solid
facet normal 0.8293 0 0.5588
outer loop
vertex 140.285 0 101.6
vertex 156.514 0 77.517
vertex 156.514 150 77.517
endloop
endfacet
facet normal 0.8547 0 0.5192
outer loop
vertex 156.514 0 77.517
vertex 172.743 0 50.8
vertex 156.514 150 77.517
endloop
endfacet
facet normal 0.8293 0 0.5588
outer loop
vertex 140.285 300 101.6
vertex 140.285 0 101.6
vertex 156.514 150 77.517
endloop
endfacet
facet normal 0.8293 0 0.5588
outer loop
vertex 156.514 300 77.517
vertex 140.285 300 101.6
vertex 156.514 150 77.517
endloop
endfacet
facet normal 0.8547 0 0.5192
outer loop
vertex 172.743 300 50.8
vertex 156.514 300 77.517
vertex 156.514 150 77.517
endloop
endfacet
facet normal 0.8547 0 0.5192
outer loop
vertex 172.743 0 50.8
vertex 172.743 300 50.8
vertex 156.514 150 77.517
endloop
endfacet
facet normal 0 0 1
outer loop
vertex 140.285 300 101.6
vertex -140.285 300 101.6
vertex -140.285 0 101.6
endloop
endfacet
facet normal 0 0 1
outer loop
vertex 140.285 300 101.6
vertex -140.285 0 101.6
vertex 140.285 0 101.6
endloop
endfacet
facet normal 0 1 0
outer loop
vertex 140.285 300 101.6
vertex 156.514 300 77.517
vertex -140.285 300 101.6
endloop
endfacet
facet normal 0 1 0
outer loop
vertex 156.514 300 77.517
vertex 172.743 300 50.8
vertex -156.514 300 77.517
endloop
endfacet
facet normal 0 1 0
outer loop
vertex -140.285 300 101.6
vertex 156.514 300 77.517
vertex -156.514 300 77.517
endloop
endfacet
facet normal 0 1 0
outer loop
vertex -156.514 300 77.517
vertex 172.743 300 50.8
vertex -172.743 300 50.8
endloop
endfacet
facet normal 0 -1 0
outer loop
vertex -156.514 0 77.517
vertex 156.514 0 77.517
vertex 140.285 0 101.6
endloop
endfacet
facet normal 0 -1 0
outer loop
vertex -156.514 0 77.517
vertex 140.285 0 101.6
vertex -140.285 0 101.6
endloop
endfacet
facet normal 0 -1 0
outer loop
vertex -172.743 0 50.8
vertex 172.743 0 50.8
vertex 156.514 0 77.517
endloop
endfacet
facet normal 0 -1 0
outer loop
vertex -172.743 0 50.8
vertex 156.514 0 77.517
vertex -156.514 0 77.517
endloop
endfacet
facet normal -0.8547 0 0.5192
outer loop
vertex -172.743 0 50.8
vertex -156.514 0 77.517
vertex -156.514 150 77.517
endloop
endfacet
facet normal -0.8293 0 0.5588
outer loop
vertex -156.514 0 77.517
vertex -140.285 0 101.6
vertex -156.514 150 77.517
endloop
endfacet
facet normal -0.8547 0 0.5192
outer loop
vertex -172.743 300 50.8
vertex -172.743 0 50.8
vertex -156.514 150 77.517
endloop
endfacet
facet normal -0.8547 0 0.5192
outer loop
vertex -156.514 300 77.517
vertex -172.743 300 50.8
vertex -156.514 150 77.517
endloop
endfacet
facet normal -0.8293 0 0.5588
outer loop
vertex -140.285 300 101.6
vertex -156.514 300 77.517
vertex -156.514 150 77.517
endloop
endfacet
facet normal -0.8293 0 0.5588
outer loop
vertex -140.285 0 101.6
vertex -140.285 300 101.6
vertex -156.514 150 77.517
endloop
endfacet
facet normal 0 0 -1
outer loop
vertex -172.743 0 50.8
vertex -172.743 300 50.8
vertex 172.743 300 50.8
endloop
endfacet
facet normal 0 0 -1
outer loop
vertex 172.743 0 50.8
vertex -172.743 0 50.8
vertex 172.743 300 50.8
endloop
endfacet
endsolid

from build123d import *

# Parameters (mm, degrees)
BOSS_EXTRUDE1_DEPTH = 300
SKETCH2_W           = 448.898553089
SKETCH2_H           = 98.376583204
CUT_EXTRUDE1_DEPTH  = 350
SKETCH3_W           = 441.3036111
SKETCH3_H           = 137.787771029
CUT_EXTRUDE2_DEPTH  = 350


with BuildPart() as part:
    # Sketch1 → Boss-Extrude1 (new body)
    with BuildSketch(Plane(origin=(0, 0, 0), x_dir=(1, 0, 0), z_dir=(0, 1, 0))):
        with BuildLine():
            Line((-200, 1e-09), (200, 1e-09))
            add(Edge.make_bspline(
                [(-200, 1e-09), (0, -400.000000001), (200, 1e-09)],
                knots=[0.056028396, 0.056028396, 0.056028396, 0.943971604, 0.943971604, 0.943971604], degree=2))
        make_face()
    extrude(amount=BOSS_EXTRUDE1_DEPTH)

    # Sketch2 → Cut-Extrude1 (cut)
    with BuildSketch(Plane(origin=(0, 300, 0), x_dir=(1, 0, 0), z_dir=(0, 1, 0))):
        with Locations((1.772551048, -1.611708397)):
            Rectangle(SKETCH2_W, SKETCH2_H)
    extrude(amount=-CUT_EXTRUDE1_DEPTH, mode=Mode.SUBTRACT)

    # Sketch3 → Cut-Extrude2 (cut)
    with BuildSketch(Plane(origin=(0, 300, 0), x_dir=(1, 0, 0), z_dir=(0, 1, 0))):
        with Locations((-0.765487617, -170.493885514)):
            Rectangle(SKETCH3_W, SKETCH3_H)
    extrude(amount=-CUT_EXTRUDE2_DEPTH, mode=Mode.SUBTRACT)


solid = part.part
